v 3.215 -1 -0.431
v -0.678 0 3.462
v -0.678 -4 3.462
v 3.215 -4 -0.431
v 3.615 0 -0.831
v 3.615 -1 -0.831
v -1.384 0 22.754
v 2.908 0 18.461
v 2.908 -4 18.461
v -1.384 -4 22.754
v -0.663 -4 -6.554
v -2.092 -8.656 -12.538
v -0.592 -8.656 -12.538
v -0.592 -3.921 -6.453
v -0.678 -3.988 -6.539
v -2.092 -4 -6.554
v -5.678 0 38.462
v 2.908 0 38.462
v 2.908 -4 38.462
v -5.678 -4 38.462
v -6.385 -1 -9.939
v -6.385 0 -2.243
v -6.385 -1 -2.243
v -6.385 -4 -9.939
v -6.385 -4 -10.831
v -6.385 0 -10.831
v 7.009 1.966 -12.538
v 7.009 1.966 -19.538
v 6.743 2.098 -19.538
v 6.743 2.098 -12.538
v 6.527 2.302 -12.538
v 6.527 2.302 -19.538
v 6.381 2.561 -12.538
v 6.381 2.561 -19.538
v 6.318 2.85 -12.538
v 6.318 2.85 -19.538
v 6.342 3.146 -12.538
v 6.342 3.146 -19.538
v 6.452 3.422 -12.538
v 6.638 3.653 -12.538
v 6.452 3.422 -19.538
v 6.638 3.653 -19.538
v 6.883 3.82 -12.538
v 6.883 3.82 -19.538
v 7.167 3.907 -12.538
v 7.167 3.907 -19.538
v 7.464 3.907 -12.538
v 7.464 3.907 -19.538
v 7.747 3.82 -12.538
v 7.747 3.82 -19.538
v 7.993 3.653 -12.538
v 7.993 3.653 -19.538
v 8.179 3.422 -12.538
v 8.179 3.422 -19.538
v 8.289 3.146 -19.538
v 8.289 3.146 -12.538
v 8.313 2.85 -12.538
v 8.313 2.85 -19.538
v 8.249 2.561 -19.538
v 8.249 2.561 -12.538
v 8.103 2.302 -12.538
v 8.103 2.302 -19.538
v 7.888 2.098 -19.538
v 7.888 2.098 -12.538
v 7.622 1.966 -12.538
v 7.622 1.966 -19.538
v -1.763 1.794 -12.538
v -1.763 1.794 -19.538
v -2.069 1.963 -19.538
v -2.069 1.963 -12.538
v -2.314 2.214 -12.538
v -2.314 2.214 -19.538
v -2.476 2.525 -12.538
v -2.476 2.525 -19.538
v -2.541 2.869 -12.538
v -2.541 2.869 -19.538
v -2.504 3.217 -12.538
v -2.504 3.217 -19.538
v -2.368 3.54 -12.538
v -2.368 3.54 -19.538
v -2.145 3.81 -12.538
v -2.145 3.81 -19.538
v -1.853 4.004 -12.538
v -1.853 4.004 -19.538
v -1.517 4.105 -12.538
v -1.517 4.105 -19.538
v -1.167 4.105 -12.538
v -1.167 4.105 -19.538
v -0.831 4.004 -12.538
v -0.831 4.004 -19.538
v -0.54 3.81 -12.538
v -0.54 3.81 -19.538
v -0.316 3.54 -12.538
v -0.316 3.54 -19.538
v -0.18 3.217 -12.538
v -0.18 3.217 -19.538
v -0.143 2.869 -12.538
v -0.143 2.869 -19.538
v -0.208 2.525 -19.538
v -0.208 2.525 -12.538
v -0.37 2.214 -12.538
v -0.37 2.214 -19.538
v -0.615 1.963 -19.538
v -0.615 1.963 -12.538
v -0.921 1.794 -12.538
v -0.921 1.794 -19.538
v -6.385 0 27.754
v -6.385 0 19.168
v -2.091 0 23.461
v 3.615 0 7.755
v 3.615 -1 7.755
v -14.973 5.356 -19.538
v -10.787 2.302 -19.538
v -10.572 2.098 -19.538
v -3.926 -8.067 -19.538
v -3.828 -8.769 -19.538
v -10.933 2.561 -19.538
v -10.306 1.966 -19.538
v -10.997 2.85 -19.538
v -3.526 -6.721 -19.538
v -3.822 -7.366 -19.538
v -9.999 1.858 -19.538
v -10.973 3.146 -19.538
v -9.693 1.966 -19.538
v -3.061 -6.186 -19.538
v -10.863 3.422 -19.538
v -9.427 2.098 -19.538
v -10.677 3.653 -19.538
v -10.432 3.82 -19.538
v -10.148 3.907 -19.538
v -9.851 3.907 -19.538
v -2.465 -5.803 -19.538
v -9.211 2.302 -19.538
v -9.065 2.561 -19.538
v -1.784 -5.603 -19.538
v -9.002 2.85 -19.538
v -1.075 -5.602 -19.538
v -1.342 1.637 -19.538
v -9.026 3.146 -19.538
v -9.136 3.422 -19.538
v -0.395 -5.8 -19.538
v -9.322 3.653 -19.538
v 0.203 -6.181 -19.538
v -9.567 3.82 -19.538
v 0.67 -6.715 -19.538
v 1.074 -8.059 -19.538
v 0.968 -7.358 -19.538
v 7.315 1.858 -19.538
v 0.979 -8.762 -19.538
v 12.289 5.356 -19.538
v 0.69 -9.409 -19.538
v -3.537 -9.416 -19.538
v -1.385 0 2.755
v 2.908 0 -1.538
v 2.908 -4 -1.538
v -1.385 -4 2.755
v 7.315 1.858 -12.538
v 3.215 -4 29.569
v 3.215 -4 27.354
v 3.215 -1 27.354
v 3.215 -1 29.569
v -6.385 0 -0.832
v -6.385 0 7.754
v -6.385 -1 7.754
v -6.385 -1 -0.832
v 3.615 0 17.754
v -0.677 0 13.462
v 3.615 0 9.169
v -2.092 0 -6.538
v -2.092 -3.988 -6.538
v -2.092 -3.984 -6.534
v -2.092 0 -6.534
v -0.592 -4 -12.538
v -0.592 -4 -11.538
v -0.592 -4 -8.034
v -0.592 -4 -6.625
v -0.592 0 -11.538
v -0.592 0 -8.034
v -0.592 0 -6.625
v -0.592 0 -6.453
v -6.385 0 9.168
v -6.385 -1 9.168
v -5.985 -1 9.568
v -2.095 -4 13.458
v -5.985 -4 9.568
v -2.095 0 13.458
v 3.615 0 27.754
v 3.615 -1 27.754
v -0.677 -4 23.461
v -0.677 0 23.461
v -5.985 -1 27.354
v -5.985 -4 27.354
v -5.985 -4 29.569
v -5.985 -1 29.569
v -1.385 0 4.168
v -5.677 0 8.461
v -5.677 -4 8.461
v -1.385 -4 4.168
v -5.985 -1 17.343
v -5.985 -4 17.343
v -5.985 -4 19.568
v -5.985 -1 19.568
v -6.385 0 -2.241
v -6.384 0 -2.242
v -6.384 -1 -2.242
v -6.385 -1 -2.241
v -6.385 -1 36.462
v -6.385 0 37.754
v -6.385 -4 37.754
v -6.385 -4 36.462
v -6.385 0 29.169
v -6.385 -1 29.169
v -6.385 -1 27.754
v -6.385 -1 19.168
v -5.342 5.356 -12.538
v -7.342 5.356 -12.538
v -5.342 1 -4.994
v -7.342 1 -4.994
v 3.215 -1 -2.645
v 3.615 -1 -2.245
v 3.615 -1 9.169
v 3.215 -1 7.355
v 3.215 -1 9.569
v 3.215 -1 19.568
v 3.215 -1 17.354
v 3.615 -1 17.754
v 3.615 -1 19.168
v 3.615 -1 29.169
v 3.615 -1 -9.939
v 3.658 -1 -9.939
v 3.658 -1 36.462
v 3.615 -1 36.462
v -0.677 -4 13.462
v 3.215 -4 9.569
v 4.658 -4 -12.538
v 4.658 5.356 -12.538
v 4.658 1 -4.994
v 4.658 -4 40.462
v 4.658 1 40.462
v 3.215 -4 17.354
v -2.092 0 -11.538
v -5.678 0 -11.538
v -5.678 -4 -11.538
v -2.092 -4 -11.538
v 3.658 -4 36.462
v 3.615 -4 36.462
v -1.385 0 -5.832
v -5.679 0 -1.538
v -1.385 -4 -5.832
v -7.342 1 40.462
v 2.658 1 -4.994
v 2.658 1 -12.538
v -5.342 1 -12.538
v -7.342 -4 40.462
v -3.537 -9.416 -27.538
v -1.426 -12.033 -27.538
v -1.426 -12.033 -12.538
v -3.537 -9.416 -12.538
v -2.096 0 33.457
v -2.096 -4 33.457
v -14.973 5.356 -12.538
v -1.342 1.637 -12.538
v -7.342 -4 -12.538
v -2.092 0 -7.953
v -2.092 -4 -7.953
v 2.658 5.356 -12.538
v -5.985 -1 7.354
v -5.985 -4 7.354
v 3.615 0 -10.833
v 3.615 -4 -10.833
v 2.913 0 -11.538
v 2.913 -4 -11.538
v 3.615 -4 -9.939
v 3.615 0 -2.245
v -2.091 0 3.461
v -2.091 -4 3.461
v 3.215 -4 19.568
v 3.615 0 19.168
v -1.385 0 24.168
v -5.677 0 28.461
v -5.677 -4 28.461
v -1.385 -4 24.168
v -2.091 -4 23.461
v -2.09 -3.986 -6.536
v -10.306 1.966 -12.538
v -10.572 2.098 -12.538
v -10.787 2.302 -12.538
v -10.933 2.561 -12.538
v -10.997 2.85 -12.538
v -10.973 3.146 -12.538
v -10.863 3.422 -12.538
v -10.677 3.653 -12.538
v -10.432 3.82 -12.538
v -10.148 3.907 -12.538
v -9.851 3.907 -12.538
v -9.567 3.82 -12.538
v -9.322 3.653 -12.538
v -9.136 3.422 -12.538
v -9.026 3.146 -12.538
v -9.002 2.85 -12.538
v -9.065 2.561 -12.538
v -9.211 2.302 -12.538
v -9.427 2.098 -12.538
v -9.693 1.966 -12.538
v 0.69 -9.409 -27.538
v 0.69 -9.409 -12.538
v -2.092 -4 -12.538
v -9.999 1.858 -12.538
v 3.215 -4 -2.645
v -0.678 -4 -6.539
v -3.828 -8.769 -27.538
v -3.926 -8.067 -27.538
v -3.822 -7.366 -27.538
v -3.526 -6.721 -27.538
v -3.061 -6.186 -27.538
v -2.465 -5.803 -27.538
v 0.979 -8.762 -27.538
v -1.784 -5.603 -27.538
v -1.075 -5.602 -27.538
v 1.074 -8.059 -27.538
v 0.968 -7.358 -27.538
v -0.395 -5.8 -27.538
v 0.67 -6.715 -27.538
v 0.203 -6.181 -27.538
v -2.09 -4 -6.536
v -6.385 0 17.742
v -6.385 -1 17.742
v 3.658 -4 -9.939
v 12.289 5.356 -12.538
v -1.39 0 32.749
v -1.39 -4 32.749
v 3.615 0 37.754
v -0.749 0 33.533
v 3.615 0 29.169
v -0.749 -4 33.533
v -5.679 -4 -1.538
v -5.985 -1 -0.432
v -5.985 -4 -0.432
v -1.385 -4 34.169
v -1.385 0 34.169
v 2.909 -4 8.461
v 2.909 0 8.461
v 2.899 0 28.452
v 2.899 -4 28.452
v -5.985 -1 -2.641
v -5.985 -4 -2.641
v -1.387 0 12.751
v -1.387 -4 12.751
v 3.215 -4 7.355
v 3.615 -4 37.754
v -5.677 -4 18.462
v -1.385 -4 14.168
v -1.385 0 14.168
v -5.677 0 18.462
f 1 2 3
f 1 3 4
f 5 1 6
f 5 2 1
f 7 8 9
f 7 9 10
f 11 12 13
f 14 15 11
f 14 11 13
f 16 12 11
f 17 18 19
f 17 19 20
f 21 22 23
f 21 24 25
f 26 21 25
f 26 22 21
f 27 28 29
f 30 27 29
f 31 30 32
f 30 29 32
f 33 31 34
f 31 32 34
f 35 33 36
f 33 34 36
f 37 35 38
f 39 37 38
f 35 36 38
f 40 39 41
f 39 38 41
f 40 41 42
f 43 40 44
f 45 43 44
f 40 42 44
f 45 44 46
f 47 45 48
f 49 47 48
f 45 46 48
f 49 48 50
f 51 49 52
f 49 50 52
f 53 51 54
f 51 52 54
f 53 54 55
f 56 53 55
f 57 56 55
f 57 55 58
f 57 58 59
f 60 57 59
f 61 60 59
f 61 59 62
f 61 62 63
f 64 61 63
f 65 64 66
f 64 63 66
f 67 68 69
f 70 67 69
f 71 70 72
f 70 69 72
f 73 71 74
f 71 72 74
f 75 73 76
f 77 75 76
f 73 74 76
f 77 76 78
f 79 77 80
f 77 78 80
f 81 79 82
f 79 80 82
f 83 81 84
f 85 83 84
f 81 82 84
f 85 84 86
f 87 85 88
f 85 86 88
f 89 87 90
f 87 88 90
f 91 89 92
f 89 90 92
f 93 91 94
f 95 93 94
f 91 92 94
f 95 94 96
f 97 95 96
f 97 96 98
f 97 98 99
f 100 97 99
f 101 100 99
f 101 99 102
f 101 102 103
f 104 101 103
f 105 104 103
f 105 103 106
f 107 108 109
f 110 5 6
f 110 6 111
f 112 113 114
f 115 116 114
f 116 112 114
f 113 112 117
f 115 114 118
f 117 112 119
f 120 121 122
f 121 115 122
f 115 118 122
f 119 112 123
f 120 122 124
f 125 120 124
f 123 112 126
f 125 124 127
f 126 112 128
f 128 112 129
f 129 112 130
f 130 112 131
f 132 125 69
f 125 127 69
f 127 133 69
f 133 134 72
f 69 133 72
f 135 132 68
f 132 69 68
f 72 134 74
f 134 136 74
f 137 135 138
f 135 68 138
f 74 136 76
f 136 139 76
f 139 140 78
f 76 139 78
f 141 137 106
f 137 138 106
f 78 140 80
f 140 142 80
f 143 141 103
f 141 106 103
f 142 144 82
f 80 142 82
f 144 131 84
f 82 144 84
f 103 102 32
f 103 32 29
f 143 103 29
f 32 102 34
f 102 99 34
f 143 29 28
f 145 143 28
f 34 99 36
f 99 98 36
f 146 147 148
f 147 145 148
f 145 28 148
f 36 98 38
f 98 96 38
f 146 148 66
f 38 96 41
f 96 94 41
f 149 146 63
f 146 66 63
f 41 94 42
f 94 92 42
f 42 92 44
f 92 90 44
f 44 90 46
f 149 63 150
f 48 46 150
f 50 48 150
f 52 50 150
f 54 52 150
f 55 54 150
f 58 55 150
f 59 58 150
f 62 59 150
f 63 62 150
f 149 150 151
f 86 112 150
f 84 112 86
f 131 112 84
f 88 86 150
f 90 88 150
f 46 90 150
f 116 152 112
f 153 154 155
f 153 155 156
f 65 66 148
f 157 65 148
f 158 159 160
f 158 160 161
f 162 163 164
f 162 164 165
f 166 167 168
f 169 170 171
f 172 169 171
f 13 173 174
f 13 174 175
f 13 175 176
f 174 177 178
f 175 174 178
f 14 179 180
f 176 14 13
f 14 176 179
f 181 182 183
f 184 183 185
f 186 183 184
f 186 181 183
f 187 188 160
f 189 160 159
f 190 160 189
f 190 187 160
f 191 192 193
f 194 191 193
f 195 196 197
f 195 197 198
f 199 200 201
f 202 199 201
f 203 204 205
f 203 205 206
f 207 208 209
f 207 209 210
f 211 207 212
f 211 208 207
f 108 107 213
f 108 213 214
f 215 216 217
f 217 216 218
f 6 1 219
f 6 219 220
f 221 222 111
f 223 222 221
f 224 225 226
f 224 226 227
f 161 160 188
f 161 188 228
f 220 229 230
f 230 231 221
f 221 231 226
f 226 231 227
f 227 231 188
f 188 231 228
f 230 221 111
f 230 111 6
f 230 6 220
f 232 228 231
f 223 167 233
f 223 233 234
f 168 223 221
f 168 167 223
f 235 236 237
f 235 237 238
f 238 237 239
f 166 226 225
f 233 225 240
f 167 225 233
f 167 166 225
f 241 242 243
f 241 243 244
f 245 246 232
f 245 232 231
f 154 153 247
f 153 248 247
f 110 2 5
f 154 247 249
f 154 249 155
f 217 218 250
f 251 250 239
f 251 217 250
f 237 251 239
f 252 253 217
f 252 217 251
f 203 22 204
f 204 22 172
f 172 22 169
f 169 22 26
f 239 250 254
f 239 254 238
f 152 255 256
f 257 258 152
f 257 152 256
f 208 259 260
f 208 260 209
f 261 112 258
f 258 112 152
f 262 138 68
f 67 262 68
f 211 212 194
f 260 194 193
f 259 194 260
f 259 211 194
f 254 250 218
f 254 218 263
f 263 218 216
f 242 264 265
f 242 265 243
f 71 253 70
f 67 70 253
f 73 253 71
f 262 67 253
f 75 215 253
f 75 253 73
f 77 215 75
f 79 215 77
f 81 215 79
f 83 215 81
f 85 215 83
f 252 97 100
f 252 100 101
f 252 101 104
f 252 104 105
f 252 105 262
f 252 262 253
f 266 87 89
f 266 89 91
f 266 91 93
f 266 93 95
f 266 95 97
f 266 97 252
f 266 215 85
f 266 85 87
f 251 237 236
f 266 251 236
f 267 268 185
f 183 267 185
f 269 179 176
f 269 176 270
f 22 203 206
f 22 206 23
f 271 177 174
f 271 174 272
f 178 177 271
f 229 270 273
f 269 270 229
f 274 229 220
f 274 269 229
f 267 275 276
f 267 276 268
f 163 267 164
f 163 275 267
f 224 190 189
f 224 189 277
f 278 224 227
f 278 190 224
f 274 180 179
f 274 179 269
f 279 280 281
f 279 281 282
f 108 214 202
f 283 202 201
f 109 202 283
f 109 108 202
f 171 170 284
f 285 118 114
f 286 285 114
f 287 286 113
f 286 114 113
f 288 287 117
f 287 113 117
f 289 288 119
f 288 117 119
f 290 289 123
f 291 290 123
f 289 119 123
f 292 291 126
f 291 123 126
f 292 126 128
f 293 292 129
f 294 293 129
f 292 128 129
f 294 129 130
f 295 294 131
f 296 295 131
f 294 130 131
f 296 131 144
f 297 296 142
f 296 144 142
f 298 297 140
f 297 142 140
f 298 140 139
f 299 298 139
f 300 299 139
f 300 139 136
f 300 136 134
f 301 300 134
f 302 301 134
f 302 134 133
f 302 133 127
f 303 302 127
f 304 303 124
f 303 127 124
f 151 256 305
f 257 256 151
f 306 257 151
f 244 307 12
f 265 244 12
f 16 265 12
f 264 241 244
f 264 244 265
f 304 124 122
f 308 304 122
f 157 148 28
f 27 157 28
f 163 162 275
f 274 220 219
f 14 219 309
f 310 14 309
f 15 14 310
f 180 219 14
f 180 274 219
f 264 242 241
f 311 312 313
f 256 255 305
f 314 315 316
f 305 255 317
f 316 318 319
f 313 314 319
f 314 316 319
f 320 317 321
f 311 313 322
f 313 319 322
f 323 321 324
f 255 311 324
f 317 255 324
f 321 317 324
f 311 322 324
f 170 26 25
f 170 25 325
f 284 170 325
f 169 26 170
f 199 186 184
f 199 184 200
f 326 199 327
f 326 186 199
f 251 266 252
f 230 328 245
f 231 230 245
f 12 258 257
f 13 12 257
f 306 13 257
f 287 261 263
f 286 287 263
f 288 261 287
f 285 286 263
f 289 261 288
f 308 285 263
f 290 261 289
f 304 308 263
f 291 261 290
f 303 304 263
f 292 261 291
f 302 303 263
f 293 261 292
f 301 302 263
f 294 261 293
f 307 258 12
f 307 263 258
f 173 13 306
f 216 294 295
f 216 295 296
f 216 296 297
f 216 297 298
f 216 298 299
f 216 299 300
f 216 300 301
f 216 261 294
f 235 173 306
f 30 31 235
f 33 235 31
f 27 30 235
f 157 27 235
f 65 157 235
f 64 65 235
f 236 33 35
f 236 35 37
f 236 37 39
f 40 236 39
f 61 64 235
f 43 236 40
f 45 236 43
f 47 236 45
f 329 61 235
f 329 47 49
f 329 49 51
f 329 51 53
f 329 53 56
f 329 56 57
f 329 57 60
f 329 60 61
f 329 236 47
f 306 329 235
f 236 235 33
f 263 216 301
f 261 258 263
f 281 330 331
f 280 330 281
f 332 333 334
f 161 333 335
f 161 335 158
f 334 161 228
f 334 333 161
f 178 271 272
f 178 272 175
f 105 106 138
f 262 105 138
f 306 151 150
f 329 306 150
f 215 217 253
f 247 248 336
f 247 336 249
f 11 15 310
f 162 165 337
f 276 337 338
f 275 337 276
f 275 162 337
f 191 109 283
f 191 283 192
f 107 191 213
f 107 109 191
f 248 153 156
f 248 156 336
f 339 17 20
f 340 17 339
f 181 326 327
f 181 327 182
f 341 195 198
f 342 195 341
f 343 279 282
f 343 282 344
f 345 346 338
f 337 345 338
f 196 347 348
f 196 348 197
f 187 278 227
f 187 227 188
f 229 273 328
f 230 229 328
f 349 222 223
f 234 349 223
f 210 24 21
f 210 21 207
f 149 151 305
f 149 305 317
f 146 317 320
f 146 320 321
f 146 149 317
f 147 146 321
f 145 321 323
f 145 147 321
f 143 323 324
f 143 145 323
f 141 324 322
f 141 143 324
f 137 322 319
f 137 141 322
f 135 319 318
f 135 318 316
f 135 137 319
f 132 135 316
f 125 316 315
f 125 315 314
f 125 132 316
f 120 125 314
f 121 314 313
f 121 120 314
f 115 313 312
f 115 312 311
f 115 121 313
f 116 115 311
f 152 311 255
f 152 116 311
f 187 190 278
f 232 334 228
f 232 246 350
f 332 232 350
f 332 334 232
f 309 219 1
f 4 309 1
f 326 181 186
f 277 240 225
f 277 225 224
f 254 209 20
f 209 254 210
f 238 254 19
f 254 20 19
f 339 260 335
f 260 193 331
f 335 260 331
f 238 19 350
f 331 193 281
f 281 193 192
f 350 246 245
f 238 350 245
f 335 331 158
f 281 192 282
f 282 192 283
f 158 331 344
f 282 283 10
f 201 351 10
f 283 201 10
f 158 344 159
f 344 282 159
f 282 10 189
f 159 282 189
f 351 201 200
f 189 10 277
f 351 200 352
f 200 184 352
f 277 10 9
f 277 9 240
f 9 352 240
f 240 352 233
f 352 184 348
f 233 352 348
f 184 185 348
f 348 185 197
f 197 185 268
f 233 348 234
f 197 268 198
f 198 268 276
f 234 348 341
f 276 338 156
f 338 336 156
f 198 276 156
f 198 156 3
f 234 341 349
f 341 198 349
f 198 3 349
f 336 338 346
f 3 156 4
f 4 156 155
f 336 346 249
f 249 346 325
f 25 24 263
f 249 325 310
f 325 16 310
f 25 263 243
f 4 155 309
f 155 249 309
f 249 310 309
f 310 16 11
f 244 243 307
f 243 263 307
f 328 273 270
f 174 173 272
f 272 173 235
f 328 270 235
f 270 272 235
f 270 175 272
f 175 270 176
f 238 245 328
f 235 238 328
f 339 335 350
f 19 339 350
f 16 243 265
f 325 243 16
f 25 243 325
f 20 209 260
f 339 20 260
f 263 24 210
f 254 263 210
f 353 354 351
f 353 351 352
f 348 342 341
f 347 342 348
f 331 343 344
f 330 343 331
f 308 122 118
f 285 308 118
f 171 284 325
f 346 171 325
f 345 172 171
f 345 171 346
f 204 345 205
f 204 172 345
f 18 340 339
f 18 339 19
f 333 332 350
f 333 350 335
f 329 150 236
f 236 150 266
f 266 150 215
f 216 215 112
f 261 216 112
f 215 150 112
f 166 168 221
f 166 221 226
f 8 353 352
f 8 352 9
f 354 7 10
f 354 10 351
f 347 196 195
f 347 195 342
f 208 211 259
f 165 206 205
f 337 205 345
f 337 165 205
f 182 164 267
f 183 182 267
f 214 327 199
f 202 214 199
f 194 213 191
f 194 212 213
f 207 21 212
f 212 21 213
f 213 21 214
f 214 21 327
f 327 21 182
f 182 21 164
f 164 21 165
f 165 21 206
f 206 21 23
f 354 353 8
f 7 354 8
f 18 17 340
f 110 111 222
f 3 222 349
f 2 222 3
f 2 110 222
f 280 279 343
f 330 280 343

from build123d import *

# Parameters (mm, degrees)
SKETCH1_W            = 12
SKETCH1_H            = 60
BOSS_EXTRUDE1_DEPTH  = 1
SKETCH4_W            = 12
SKETCH4_H            = 60
BOSS_EXTRUDE5_DEPTH  = 4
SKETCH3_W            = 0.442585723
SKETCH3_H            = 46.400729484
SKETCH3_W_2          = 0.4
CUT_EXTRUDE1_DEPTH   = 3
BOSS_EXTRUDE6_DEPTH  = 7
BOSS_EXTRUDE11_DEPTH = 8
BOSS_EXTRUDE12_DEPTH = 2
BOSS_EXTRUDE13_DEPTH = 0.75
BOSS_EXTRUDE15_DEPTH = 2


with BuildPart() as part:
    # Sketch1 → Boss-Extrude1 (new body)
    with BuildSketch(Plane(origin=(0, 0, 0), x_dir=(1, 0, 0), z_dir=(0, 1, 0))):
        with Locations((-1.342029662, -10.461538462)):
            Rectangle(SKETCH1_W, SKETCH1_H)
    extrude(amount=BOSS_EXTRUDE1_DEPTH)

    # Sketch4 → Boss-Extrude5 (add)
    with BuildSketch(Plane(origin=(0, 0, 0), x_dir=(1, 0, 0), z_dir=(0, 1, 0))):
        with Locations((-1.342029662, -10.461538462)):
            Rectangle(SKETCH4_W, SKETCH4_H)
        Polygon((-2.096130055, -33.457130572), (-6.384615385, -37.75443168), (-6.384611455, -29.168649172), align=None, mode=Mode.SUBTRACT)
        Polygon((2.908277834, -38.461538462), (-5.677508603, -38.461538462), (-1.384615385, -34.168645243), align=None, mode=Mode.SUBTRACT)
        Polygon((-1.38975443, -32.749302861), (-5.677336591, -28.461186458), (-1.384615385, -24.168121227), (2.898997747, -28.451734358), align=None, mode=Mode.SUBTRACT)
        Polygon((-2.091498793, -23.461237818), (-6.384610808, -27.754427103), (-6.384606877, -19.168129734), align=None, mode=Mode.SUBTRACT)
        Polygon((-1.384401984, -22.754128282), (-5.676963509, -18.461572954), (-1.384618257, -14.16814285), (2.90844487, -18.461204162), align=None, mode=Mode.SUBTRACT)
        Polygon((-2.094846949, -13.457914458), (-6.38460623, -17.742175237), (-6.38460623, -9.168156991), align=None, mode=Mode.SUBTRACT)
        Polygon((3.615384615, -29.168645243), (3.615384615, -37.75443168), (-0.749170508, -33.533200366), align=None, mode=Mode.SUBTRACT)
        Polygon((3.615384615, -19.168465252), (3.615384615, -27.753907665), (-0.677336591, -23.461186458), align=None, mode=Mode.SUBTRACT)
        Polygon((3.615384615, -17.754251693), (-0.676897524, -13.461506969), (3.615384615, -9.169224829), align=None, mode=Mode.SUBTRACT)
        Polygon((-6.384597723, 0.832144172), (-2.091409836, -3.461043715), (-6.384601653, -7.753916614), align=None, mode=Mode.SUBTRACT)
        Polygon((2.908517821, -8.460971372), (-1.387204346, -12.751178894), (-5.677010576, -8.461229413), (-1.384615385, -4.167838166), align=None, mode=Mode.SUBTRACT)
        Polygon((-1.385221722, -2.75490806), (-5.679497842, 1.537745361), (-1.38541394, 5.831829263), (2.908210299, 1.538205024), align=None, mode=Mode.SUBTRACT)
        Polygon((-2.089578329, 6.535993652), (-6.3837953, 2.241776681), (-6.384597078, 2.240974904), (-6.384597078, 2.242578156), (-6.384593146, 10.83100847), align=None, mode=Mode.SUBTRACT)
        Polygon((-5.677832652, 11.538461538), (2.912889557, 11.538461538), (-1.382471548, 7.243100433), align=None, mode=Mode.SUBTRACT)
        Polygon((3.615384615, -7.755011267), (-0.677821818, -3.462040655), (3.615384615, 0.831165778), align=None, mode=Mode.SUBTRACT)
        Polygon((3.615384615, 2.245379341), (-0.678307159, 6.538936044), (3.615384615, 10.832627818), align=None, mode=Mode.SUBTRACT)
    extrude(amount=-BOSS_EXTRUDE5_DEPTH)

    # Sketch3 → Cut-Extrude1 (cut)
    with BuildSketch(Plane.XZ.offset(4)):
        with Locations((3.436677476, 13.26117372)):
            Rectangle(SKETCH3_W, SKETCH3_H)
        with Locations((-6.184615385, 13.26117372)):
            Rectangle(SKETCH3_W_2, SKETCH3_H)
    extrude(amount=-CUT_EXTRUDE1_DEPTH, mode=Mode.SUBTRACT)

    # Sketch5 → Boss-Extrude6 (add)
    with BuildSketch(Plane(origin=(0, 0, -19.538461538), x_dir=(-1, 0, 0), z_dir=(0, 0, -1))):
        Polygon((-12.288789064, 5.355892869), (14.972848388, 5.355892869), (3.537352374, -9.415920613), (1.425918842, -12.033387248), (-0.689767913, -9.409188123), align=None)
        with BuildLine():
            Line((9.692725832, 1.966121199), (9.999443939, 1.857726092))
            Line((9.999443939, 1.857726092), (10.306162047, 1.966121199))
            ThreePointArc((10.306162047, 1.966121199), (9.999443939, 3.917921599), (9.692725832, 1.966121199))
        make_face(mode=Mode.SUBTRACT)
        with BuildLine():
            Line((-7.622102723, 1.966121199), (-7.315384615, 1.857726092))
            Line((-7.315384615, 1.857726092), (-7.008666508, 1.966121199))
            ThreePointArc((-7.008666508, 1.966121199), (-7.315384615, 3.917921599), (-7.622102723, 1.966121199))
        make_face(mode=Mode.SUBTRACT)
        with BuildLine():
            Line((0.921478569, 1.79402802), (1.342029662, 1.636661499))
            Line((1.342029662, 1.636661499), (1.762580755, 1.79402802))
            ThreePointArc((1.762580755, 1.79402802), (1.342029662, 4.117921599), (0.921478569, 1.79402802))
        make_face(mode=Mode.SUBTRACT)
    extrude(amount=-BOSS_EXTRUDE6_DEPTH)

    # Sketch5<3> → Boss-Extrude11 (add)
    with BuildSketch(Plane(origin=(0, 0, -19.538461538), x_dir=(-1, 0, 0), z_dir=(0, 0, -1))):
        with BuildLine():
            Line((3.537352374, -9.415920613), (1.425918842, -12.033387248))
            Line((1.425918842, -12.033387248), (-0.689767913, -9.409188123))
            ThreePointArc((-0.689767913, -9.409188123), (1.429900561, -5.57732435), (3.537352374, -9.415920613))
        make_face()
    extrude(amount=BOSS_EXTRUDE11_DEPTH)

    # Sketch11 → Boss-Extrude12 (add)
    with BuildSketch(Plane.ZY.offset(7.342029662)):
        Polygon((-12.538461538, 5.355892869), (-4.993833778, 1), (-12.538461538, 1), align=None)
    extrude(amount=-BOSS_EXTRUDE12_DEPTH)

    # Sketch12 → Boss-Extrude13 (add, symmetric)
    with BuildSketch(Plane.ZY.offset(1.342029662)):
        Polygon((-13.859142787, 0.316720052), (-13.859142787, -4.418628297), (-13.859142787, -9.68323793), (-6.410996577, -3.888931374), (-6.410996577, 0.316720052), align=None)
    extrude(amount=BOSS_EXTRUDE13_DEPTH, both=True)

    # Sketch14 → Boss-Extrude15 (add)
    with BuildSketch(Plane(origin=(4.657970338, 0, 0), x_dir=(0, 0, -1), z_dir=(1, 0, 0))):
        Polygon((4.993833778, 1), (12.538461538, 5.355892869), (12.538461538, 1), align=None)
    extrude(amount=-BOSS_EXTRUDE15_DEPTH)


solid = part.part
